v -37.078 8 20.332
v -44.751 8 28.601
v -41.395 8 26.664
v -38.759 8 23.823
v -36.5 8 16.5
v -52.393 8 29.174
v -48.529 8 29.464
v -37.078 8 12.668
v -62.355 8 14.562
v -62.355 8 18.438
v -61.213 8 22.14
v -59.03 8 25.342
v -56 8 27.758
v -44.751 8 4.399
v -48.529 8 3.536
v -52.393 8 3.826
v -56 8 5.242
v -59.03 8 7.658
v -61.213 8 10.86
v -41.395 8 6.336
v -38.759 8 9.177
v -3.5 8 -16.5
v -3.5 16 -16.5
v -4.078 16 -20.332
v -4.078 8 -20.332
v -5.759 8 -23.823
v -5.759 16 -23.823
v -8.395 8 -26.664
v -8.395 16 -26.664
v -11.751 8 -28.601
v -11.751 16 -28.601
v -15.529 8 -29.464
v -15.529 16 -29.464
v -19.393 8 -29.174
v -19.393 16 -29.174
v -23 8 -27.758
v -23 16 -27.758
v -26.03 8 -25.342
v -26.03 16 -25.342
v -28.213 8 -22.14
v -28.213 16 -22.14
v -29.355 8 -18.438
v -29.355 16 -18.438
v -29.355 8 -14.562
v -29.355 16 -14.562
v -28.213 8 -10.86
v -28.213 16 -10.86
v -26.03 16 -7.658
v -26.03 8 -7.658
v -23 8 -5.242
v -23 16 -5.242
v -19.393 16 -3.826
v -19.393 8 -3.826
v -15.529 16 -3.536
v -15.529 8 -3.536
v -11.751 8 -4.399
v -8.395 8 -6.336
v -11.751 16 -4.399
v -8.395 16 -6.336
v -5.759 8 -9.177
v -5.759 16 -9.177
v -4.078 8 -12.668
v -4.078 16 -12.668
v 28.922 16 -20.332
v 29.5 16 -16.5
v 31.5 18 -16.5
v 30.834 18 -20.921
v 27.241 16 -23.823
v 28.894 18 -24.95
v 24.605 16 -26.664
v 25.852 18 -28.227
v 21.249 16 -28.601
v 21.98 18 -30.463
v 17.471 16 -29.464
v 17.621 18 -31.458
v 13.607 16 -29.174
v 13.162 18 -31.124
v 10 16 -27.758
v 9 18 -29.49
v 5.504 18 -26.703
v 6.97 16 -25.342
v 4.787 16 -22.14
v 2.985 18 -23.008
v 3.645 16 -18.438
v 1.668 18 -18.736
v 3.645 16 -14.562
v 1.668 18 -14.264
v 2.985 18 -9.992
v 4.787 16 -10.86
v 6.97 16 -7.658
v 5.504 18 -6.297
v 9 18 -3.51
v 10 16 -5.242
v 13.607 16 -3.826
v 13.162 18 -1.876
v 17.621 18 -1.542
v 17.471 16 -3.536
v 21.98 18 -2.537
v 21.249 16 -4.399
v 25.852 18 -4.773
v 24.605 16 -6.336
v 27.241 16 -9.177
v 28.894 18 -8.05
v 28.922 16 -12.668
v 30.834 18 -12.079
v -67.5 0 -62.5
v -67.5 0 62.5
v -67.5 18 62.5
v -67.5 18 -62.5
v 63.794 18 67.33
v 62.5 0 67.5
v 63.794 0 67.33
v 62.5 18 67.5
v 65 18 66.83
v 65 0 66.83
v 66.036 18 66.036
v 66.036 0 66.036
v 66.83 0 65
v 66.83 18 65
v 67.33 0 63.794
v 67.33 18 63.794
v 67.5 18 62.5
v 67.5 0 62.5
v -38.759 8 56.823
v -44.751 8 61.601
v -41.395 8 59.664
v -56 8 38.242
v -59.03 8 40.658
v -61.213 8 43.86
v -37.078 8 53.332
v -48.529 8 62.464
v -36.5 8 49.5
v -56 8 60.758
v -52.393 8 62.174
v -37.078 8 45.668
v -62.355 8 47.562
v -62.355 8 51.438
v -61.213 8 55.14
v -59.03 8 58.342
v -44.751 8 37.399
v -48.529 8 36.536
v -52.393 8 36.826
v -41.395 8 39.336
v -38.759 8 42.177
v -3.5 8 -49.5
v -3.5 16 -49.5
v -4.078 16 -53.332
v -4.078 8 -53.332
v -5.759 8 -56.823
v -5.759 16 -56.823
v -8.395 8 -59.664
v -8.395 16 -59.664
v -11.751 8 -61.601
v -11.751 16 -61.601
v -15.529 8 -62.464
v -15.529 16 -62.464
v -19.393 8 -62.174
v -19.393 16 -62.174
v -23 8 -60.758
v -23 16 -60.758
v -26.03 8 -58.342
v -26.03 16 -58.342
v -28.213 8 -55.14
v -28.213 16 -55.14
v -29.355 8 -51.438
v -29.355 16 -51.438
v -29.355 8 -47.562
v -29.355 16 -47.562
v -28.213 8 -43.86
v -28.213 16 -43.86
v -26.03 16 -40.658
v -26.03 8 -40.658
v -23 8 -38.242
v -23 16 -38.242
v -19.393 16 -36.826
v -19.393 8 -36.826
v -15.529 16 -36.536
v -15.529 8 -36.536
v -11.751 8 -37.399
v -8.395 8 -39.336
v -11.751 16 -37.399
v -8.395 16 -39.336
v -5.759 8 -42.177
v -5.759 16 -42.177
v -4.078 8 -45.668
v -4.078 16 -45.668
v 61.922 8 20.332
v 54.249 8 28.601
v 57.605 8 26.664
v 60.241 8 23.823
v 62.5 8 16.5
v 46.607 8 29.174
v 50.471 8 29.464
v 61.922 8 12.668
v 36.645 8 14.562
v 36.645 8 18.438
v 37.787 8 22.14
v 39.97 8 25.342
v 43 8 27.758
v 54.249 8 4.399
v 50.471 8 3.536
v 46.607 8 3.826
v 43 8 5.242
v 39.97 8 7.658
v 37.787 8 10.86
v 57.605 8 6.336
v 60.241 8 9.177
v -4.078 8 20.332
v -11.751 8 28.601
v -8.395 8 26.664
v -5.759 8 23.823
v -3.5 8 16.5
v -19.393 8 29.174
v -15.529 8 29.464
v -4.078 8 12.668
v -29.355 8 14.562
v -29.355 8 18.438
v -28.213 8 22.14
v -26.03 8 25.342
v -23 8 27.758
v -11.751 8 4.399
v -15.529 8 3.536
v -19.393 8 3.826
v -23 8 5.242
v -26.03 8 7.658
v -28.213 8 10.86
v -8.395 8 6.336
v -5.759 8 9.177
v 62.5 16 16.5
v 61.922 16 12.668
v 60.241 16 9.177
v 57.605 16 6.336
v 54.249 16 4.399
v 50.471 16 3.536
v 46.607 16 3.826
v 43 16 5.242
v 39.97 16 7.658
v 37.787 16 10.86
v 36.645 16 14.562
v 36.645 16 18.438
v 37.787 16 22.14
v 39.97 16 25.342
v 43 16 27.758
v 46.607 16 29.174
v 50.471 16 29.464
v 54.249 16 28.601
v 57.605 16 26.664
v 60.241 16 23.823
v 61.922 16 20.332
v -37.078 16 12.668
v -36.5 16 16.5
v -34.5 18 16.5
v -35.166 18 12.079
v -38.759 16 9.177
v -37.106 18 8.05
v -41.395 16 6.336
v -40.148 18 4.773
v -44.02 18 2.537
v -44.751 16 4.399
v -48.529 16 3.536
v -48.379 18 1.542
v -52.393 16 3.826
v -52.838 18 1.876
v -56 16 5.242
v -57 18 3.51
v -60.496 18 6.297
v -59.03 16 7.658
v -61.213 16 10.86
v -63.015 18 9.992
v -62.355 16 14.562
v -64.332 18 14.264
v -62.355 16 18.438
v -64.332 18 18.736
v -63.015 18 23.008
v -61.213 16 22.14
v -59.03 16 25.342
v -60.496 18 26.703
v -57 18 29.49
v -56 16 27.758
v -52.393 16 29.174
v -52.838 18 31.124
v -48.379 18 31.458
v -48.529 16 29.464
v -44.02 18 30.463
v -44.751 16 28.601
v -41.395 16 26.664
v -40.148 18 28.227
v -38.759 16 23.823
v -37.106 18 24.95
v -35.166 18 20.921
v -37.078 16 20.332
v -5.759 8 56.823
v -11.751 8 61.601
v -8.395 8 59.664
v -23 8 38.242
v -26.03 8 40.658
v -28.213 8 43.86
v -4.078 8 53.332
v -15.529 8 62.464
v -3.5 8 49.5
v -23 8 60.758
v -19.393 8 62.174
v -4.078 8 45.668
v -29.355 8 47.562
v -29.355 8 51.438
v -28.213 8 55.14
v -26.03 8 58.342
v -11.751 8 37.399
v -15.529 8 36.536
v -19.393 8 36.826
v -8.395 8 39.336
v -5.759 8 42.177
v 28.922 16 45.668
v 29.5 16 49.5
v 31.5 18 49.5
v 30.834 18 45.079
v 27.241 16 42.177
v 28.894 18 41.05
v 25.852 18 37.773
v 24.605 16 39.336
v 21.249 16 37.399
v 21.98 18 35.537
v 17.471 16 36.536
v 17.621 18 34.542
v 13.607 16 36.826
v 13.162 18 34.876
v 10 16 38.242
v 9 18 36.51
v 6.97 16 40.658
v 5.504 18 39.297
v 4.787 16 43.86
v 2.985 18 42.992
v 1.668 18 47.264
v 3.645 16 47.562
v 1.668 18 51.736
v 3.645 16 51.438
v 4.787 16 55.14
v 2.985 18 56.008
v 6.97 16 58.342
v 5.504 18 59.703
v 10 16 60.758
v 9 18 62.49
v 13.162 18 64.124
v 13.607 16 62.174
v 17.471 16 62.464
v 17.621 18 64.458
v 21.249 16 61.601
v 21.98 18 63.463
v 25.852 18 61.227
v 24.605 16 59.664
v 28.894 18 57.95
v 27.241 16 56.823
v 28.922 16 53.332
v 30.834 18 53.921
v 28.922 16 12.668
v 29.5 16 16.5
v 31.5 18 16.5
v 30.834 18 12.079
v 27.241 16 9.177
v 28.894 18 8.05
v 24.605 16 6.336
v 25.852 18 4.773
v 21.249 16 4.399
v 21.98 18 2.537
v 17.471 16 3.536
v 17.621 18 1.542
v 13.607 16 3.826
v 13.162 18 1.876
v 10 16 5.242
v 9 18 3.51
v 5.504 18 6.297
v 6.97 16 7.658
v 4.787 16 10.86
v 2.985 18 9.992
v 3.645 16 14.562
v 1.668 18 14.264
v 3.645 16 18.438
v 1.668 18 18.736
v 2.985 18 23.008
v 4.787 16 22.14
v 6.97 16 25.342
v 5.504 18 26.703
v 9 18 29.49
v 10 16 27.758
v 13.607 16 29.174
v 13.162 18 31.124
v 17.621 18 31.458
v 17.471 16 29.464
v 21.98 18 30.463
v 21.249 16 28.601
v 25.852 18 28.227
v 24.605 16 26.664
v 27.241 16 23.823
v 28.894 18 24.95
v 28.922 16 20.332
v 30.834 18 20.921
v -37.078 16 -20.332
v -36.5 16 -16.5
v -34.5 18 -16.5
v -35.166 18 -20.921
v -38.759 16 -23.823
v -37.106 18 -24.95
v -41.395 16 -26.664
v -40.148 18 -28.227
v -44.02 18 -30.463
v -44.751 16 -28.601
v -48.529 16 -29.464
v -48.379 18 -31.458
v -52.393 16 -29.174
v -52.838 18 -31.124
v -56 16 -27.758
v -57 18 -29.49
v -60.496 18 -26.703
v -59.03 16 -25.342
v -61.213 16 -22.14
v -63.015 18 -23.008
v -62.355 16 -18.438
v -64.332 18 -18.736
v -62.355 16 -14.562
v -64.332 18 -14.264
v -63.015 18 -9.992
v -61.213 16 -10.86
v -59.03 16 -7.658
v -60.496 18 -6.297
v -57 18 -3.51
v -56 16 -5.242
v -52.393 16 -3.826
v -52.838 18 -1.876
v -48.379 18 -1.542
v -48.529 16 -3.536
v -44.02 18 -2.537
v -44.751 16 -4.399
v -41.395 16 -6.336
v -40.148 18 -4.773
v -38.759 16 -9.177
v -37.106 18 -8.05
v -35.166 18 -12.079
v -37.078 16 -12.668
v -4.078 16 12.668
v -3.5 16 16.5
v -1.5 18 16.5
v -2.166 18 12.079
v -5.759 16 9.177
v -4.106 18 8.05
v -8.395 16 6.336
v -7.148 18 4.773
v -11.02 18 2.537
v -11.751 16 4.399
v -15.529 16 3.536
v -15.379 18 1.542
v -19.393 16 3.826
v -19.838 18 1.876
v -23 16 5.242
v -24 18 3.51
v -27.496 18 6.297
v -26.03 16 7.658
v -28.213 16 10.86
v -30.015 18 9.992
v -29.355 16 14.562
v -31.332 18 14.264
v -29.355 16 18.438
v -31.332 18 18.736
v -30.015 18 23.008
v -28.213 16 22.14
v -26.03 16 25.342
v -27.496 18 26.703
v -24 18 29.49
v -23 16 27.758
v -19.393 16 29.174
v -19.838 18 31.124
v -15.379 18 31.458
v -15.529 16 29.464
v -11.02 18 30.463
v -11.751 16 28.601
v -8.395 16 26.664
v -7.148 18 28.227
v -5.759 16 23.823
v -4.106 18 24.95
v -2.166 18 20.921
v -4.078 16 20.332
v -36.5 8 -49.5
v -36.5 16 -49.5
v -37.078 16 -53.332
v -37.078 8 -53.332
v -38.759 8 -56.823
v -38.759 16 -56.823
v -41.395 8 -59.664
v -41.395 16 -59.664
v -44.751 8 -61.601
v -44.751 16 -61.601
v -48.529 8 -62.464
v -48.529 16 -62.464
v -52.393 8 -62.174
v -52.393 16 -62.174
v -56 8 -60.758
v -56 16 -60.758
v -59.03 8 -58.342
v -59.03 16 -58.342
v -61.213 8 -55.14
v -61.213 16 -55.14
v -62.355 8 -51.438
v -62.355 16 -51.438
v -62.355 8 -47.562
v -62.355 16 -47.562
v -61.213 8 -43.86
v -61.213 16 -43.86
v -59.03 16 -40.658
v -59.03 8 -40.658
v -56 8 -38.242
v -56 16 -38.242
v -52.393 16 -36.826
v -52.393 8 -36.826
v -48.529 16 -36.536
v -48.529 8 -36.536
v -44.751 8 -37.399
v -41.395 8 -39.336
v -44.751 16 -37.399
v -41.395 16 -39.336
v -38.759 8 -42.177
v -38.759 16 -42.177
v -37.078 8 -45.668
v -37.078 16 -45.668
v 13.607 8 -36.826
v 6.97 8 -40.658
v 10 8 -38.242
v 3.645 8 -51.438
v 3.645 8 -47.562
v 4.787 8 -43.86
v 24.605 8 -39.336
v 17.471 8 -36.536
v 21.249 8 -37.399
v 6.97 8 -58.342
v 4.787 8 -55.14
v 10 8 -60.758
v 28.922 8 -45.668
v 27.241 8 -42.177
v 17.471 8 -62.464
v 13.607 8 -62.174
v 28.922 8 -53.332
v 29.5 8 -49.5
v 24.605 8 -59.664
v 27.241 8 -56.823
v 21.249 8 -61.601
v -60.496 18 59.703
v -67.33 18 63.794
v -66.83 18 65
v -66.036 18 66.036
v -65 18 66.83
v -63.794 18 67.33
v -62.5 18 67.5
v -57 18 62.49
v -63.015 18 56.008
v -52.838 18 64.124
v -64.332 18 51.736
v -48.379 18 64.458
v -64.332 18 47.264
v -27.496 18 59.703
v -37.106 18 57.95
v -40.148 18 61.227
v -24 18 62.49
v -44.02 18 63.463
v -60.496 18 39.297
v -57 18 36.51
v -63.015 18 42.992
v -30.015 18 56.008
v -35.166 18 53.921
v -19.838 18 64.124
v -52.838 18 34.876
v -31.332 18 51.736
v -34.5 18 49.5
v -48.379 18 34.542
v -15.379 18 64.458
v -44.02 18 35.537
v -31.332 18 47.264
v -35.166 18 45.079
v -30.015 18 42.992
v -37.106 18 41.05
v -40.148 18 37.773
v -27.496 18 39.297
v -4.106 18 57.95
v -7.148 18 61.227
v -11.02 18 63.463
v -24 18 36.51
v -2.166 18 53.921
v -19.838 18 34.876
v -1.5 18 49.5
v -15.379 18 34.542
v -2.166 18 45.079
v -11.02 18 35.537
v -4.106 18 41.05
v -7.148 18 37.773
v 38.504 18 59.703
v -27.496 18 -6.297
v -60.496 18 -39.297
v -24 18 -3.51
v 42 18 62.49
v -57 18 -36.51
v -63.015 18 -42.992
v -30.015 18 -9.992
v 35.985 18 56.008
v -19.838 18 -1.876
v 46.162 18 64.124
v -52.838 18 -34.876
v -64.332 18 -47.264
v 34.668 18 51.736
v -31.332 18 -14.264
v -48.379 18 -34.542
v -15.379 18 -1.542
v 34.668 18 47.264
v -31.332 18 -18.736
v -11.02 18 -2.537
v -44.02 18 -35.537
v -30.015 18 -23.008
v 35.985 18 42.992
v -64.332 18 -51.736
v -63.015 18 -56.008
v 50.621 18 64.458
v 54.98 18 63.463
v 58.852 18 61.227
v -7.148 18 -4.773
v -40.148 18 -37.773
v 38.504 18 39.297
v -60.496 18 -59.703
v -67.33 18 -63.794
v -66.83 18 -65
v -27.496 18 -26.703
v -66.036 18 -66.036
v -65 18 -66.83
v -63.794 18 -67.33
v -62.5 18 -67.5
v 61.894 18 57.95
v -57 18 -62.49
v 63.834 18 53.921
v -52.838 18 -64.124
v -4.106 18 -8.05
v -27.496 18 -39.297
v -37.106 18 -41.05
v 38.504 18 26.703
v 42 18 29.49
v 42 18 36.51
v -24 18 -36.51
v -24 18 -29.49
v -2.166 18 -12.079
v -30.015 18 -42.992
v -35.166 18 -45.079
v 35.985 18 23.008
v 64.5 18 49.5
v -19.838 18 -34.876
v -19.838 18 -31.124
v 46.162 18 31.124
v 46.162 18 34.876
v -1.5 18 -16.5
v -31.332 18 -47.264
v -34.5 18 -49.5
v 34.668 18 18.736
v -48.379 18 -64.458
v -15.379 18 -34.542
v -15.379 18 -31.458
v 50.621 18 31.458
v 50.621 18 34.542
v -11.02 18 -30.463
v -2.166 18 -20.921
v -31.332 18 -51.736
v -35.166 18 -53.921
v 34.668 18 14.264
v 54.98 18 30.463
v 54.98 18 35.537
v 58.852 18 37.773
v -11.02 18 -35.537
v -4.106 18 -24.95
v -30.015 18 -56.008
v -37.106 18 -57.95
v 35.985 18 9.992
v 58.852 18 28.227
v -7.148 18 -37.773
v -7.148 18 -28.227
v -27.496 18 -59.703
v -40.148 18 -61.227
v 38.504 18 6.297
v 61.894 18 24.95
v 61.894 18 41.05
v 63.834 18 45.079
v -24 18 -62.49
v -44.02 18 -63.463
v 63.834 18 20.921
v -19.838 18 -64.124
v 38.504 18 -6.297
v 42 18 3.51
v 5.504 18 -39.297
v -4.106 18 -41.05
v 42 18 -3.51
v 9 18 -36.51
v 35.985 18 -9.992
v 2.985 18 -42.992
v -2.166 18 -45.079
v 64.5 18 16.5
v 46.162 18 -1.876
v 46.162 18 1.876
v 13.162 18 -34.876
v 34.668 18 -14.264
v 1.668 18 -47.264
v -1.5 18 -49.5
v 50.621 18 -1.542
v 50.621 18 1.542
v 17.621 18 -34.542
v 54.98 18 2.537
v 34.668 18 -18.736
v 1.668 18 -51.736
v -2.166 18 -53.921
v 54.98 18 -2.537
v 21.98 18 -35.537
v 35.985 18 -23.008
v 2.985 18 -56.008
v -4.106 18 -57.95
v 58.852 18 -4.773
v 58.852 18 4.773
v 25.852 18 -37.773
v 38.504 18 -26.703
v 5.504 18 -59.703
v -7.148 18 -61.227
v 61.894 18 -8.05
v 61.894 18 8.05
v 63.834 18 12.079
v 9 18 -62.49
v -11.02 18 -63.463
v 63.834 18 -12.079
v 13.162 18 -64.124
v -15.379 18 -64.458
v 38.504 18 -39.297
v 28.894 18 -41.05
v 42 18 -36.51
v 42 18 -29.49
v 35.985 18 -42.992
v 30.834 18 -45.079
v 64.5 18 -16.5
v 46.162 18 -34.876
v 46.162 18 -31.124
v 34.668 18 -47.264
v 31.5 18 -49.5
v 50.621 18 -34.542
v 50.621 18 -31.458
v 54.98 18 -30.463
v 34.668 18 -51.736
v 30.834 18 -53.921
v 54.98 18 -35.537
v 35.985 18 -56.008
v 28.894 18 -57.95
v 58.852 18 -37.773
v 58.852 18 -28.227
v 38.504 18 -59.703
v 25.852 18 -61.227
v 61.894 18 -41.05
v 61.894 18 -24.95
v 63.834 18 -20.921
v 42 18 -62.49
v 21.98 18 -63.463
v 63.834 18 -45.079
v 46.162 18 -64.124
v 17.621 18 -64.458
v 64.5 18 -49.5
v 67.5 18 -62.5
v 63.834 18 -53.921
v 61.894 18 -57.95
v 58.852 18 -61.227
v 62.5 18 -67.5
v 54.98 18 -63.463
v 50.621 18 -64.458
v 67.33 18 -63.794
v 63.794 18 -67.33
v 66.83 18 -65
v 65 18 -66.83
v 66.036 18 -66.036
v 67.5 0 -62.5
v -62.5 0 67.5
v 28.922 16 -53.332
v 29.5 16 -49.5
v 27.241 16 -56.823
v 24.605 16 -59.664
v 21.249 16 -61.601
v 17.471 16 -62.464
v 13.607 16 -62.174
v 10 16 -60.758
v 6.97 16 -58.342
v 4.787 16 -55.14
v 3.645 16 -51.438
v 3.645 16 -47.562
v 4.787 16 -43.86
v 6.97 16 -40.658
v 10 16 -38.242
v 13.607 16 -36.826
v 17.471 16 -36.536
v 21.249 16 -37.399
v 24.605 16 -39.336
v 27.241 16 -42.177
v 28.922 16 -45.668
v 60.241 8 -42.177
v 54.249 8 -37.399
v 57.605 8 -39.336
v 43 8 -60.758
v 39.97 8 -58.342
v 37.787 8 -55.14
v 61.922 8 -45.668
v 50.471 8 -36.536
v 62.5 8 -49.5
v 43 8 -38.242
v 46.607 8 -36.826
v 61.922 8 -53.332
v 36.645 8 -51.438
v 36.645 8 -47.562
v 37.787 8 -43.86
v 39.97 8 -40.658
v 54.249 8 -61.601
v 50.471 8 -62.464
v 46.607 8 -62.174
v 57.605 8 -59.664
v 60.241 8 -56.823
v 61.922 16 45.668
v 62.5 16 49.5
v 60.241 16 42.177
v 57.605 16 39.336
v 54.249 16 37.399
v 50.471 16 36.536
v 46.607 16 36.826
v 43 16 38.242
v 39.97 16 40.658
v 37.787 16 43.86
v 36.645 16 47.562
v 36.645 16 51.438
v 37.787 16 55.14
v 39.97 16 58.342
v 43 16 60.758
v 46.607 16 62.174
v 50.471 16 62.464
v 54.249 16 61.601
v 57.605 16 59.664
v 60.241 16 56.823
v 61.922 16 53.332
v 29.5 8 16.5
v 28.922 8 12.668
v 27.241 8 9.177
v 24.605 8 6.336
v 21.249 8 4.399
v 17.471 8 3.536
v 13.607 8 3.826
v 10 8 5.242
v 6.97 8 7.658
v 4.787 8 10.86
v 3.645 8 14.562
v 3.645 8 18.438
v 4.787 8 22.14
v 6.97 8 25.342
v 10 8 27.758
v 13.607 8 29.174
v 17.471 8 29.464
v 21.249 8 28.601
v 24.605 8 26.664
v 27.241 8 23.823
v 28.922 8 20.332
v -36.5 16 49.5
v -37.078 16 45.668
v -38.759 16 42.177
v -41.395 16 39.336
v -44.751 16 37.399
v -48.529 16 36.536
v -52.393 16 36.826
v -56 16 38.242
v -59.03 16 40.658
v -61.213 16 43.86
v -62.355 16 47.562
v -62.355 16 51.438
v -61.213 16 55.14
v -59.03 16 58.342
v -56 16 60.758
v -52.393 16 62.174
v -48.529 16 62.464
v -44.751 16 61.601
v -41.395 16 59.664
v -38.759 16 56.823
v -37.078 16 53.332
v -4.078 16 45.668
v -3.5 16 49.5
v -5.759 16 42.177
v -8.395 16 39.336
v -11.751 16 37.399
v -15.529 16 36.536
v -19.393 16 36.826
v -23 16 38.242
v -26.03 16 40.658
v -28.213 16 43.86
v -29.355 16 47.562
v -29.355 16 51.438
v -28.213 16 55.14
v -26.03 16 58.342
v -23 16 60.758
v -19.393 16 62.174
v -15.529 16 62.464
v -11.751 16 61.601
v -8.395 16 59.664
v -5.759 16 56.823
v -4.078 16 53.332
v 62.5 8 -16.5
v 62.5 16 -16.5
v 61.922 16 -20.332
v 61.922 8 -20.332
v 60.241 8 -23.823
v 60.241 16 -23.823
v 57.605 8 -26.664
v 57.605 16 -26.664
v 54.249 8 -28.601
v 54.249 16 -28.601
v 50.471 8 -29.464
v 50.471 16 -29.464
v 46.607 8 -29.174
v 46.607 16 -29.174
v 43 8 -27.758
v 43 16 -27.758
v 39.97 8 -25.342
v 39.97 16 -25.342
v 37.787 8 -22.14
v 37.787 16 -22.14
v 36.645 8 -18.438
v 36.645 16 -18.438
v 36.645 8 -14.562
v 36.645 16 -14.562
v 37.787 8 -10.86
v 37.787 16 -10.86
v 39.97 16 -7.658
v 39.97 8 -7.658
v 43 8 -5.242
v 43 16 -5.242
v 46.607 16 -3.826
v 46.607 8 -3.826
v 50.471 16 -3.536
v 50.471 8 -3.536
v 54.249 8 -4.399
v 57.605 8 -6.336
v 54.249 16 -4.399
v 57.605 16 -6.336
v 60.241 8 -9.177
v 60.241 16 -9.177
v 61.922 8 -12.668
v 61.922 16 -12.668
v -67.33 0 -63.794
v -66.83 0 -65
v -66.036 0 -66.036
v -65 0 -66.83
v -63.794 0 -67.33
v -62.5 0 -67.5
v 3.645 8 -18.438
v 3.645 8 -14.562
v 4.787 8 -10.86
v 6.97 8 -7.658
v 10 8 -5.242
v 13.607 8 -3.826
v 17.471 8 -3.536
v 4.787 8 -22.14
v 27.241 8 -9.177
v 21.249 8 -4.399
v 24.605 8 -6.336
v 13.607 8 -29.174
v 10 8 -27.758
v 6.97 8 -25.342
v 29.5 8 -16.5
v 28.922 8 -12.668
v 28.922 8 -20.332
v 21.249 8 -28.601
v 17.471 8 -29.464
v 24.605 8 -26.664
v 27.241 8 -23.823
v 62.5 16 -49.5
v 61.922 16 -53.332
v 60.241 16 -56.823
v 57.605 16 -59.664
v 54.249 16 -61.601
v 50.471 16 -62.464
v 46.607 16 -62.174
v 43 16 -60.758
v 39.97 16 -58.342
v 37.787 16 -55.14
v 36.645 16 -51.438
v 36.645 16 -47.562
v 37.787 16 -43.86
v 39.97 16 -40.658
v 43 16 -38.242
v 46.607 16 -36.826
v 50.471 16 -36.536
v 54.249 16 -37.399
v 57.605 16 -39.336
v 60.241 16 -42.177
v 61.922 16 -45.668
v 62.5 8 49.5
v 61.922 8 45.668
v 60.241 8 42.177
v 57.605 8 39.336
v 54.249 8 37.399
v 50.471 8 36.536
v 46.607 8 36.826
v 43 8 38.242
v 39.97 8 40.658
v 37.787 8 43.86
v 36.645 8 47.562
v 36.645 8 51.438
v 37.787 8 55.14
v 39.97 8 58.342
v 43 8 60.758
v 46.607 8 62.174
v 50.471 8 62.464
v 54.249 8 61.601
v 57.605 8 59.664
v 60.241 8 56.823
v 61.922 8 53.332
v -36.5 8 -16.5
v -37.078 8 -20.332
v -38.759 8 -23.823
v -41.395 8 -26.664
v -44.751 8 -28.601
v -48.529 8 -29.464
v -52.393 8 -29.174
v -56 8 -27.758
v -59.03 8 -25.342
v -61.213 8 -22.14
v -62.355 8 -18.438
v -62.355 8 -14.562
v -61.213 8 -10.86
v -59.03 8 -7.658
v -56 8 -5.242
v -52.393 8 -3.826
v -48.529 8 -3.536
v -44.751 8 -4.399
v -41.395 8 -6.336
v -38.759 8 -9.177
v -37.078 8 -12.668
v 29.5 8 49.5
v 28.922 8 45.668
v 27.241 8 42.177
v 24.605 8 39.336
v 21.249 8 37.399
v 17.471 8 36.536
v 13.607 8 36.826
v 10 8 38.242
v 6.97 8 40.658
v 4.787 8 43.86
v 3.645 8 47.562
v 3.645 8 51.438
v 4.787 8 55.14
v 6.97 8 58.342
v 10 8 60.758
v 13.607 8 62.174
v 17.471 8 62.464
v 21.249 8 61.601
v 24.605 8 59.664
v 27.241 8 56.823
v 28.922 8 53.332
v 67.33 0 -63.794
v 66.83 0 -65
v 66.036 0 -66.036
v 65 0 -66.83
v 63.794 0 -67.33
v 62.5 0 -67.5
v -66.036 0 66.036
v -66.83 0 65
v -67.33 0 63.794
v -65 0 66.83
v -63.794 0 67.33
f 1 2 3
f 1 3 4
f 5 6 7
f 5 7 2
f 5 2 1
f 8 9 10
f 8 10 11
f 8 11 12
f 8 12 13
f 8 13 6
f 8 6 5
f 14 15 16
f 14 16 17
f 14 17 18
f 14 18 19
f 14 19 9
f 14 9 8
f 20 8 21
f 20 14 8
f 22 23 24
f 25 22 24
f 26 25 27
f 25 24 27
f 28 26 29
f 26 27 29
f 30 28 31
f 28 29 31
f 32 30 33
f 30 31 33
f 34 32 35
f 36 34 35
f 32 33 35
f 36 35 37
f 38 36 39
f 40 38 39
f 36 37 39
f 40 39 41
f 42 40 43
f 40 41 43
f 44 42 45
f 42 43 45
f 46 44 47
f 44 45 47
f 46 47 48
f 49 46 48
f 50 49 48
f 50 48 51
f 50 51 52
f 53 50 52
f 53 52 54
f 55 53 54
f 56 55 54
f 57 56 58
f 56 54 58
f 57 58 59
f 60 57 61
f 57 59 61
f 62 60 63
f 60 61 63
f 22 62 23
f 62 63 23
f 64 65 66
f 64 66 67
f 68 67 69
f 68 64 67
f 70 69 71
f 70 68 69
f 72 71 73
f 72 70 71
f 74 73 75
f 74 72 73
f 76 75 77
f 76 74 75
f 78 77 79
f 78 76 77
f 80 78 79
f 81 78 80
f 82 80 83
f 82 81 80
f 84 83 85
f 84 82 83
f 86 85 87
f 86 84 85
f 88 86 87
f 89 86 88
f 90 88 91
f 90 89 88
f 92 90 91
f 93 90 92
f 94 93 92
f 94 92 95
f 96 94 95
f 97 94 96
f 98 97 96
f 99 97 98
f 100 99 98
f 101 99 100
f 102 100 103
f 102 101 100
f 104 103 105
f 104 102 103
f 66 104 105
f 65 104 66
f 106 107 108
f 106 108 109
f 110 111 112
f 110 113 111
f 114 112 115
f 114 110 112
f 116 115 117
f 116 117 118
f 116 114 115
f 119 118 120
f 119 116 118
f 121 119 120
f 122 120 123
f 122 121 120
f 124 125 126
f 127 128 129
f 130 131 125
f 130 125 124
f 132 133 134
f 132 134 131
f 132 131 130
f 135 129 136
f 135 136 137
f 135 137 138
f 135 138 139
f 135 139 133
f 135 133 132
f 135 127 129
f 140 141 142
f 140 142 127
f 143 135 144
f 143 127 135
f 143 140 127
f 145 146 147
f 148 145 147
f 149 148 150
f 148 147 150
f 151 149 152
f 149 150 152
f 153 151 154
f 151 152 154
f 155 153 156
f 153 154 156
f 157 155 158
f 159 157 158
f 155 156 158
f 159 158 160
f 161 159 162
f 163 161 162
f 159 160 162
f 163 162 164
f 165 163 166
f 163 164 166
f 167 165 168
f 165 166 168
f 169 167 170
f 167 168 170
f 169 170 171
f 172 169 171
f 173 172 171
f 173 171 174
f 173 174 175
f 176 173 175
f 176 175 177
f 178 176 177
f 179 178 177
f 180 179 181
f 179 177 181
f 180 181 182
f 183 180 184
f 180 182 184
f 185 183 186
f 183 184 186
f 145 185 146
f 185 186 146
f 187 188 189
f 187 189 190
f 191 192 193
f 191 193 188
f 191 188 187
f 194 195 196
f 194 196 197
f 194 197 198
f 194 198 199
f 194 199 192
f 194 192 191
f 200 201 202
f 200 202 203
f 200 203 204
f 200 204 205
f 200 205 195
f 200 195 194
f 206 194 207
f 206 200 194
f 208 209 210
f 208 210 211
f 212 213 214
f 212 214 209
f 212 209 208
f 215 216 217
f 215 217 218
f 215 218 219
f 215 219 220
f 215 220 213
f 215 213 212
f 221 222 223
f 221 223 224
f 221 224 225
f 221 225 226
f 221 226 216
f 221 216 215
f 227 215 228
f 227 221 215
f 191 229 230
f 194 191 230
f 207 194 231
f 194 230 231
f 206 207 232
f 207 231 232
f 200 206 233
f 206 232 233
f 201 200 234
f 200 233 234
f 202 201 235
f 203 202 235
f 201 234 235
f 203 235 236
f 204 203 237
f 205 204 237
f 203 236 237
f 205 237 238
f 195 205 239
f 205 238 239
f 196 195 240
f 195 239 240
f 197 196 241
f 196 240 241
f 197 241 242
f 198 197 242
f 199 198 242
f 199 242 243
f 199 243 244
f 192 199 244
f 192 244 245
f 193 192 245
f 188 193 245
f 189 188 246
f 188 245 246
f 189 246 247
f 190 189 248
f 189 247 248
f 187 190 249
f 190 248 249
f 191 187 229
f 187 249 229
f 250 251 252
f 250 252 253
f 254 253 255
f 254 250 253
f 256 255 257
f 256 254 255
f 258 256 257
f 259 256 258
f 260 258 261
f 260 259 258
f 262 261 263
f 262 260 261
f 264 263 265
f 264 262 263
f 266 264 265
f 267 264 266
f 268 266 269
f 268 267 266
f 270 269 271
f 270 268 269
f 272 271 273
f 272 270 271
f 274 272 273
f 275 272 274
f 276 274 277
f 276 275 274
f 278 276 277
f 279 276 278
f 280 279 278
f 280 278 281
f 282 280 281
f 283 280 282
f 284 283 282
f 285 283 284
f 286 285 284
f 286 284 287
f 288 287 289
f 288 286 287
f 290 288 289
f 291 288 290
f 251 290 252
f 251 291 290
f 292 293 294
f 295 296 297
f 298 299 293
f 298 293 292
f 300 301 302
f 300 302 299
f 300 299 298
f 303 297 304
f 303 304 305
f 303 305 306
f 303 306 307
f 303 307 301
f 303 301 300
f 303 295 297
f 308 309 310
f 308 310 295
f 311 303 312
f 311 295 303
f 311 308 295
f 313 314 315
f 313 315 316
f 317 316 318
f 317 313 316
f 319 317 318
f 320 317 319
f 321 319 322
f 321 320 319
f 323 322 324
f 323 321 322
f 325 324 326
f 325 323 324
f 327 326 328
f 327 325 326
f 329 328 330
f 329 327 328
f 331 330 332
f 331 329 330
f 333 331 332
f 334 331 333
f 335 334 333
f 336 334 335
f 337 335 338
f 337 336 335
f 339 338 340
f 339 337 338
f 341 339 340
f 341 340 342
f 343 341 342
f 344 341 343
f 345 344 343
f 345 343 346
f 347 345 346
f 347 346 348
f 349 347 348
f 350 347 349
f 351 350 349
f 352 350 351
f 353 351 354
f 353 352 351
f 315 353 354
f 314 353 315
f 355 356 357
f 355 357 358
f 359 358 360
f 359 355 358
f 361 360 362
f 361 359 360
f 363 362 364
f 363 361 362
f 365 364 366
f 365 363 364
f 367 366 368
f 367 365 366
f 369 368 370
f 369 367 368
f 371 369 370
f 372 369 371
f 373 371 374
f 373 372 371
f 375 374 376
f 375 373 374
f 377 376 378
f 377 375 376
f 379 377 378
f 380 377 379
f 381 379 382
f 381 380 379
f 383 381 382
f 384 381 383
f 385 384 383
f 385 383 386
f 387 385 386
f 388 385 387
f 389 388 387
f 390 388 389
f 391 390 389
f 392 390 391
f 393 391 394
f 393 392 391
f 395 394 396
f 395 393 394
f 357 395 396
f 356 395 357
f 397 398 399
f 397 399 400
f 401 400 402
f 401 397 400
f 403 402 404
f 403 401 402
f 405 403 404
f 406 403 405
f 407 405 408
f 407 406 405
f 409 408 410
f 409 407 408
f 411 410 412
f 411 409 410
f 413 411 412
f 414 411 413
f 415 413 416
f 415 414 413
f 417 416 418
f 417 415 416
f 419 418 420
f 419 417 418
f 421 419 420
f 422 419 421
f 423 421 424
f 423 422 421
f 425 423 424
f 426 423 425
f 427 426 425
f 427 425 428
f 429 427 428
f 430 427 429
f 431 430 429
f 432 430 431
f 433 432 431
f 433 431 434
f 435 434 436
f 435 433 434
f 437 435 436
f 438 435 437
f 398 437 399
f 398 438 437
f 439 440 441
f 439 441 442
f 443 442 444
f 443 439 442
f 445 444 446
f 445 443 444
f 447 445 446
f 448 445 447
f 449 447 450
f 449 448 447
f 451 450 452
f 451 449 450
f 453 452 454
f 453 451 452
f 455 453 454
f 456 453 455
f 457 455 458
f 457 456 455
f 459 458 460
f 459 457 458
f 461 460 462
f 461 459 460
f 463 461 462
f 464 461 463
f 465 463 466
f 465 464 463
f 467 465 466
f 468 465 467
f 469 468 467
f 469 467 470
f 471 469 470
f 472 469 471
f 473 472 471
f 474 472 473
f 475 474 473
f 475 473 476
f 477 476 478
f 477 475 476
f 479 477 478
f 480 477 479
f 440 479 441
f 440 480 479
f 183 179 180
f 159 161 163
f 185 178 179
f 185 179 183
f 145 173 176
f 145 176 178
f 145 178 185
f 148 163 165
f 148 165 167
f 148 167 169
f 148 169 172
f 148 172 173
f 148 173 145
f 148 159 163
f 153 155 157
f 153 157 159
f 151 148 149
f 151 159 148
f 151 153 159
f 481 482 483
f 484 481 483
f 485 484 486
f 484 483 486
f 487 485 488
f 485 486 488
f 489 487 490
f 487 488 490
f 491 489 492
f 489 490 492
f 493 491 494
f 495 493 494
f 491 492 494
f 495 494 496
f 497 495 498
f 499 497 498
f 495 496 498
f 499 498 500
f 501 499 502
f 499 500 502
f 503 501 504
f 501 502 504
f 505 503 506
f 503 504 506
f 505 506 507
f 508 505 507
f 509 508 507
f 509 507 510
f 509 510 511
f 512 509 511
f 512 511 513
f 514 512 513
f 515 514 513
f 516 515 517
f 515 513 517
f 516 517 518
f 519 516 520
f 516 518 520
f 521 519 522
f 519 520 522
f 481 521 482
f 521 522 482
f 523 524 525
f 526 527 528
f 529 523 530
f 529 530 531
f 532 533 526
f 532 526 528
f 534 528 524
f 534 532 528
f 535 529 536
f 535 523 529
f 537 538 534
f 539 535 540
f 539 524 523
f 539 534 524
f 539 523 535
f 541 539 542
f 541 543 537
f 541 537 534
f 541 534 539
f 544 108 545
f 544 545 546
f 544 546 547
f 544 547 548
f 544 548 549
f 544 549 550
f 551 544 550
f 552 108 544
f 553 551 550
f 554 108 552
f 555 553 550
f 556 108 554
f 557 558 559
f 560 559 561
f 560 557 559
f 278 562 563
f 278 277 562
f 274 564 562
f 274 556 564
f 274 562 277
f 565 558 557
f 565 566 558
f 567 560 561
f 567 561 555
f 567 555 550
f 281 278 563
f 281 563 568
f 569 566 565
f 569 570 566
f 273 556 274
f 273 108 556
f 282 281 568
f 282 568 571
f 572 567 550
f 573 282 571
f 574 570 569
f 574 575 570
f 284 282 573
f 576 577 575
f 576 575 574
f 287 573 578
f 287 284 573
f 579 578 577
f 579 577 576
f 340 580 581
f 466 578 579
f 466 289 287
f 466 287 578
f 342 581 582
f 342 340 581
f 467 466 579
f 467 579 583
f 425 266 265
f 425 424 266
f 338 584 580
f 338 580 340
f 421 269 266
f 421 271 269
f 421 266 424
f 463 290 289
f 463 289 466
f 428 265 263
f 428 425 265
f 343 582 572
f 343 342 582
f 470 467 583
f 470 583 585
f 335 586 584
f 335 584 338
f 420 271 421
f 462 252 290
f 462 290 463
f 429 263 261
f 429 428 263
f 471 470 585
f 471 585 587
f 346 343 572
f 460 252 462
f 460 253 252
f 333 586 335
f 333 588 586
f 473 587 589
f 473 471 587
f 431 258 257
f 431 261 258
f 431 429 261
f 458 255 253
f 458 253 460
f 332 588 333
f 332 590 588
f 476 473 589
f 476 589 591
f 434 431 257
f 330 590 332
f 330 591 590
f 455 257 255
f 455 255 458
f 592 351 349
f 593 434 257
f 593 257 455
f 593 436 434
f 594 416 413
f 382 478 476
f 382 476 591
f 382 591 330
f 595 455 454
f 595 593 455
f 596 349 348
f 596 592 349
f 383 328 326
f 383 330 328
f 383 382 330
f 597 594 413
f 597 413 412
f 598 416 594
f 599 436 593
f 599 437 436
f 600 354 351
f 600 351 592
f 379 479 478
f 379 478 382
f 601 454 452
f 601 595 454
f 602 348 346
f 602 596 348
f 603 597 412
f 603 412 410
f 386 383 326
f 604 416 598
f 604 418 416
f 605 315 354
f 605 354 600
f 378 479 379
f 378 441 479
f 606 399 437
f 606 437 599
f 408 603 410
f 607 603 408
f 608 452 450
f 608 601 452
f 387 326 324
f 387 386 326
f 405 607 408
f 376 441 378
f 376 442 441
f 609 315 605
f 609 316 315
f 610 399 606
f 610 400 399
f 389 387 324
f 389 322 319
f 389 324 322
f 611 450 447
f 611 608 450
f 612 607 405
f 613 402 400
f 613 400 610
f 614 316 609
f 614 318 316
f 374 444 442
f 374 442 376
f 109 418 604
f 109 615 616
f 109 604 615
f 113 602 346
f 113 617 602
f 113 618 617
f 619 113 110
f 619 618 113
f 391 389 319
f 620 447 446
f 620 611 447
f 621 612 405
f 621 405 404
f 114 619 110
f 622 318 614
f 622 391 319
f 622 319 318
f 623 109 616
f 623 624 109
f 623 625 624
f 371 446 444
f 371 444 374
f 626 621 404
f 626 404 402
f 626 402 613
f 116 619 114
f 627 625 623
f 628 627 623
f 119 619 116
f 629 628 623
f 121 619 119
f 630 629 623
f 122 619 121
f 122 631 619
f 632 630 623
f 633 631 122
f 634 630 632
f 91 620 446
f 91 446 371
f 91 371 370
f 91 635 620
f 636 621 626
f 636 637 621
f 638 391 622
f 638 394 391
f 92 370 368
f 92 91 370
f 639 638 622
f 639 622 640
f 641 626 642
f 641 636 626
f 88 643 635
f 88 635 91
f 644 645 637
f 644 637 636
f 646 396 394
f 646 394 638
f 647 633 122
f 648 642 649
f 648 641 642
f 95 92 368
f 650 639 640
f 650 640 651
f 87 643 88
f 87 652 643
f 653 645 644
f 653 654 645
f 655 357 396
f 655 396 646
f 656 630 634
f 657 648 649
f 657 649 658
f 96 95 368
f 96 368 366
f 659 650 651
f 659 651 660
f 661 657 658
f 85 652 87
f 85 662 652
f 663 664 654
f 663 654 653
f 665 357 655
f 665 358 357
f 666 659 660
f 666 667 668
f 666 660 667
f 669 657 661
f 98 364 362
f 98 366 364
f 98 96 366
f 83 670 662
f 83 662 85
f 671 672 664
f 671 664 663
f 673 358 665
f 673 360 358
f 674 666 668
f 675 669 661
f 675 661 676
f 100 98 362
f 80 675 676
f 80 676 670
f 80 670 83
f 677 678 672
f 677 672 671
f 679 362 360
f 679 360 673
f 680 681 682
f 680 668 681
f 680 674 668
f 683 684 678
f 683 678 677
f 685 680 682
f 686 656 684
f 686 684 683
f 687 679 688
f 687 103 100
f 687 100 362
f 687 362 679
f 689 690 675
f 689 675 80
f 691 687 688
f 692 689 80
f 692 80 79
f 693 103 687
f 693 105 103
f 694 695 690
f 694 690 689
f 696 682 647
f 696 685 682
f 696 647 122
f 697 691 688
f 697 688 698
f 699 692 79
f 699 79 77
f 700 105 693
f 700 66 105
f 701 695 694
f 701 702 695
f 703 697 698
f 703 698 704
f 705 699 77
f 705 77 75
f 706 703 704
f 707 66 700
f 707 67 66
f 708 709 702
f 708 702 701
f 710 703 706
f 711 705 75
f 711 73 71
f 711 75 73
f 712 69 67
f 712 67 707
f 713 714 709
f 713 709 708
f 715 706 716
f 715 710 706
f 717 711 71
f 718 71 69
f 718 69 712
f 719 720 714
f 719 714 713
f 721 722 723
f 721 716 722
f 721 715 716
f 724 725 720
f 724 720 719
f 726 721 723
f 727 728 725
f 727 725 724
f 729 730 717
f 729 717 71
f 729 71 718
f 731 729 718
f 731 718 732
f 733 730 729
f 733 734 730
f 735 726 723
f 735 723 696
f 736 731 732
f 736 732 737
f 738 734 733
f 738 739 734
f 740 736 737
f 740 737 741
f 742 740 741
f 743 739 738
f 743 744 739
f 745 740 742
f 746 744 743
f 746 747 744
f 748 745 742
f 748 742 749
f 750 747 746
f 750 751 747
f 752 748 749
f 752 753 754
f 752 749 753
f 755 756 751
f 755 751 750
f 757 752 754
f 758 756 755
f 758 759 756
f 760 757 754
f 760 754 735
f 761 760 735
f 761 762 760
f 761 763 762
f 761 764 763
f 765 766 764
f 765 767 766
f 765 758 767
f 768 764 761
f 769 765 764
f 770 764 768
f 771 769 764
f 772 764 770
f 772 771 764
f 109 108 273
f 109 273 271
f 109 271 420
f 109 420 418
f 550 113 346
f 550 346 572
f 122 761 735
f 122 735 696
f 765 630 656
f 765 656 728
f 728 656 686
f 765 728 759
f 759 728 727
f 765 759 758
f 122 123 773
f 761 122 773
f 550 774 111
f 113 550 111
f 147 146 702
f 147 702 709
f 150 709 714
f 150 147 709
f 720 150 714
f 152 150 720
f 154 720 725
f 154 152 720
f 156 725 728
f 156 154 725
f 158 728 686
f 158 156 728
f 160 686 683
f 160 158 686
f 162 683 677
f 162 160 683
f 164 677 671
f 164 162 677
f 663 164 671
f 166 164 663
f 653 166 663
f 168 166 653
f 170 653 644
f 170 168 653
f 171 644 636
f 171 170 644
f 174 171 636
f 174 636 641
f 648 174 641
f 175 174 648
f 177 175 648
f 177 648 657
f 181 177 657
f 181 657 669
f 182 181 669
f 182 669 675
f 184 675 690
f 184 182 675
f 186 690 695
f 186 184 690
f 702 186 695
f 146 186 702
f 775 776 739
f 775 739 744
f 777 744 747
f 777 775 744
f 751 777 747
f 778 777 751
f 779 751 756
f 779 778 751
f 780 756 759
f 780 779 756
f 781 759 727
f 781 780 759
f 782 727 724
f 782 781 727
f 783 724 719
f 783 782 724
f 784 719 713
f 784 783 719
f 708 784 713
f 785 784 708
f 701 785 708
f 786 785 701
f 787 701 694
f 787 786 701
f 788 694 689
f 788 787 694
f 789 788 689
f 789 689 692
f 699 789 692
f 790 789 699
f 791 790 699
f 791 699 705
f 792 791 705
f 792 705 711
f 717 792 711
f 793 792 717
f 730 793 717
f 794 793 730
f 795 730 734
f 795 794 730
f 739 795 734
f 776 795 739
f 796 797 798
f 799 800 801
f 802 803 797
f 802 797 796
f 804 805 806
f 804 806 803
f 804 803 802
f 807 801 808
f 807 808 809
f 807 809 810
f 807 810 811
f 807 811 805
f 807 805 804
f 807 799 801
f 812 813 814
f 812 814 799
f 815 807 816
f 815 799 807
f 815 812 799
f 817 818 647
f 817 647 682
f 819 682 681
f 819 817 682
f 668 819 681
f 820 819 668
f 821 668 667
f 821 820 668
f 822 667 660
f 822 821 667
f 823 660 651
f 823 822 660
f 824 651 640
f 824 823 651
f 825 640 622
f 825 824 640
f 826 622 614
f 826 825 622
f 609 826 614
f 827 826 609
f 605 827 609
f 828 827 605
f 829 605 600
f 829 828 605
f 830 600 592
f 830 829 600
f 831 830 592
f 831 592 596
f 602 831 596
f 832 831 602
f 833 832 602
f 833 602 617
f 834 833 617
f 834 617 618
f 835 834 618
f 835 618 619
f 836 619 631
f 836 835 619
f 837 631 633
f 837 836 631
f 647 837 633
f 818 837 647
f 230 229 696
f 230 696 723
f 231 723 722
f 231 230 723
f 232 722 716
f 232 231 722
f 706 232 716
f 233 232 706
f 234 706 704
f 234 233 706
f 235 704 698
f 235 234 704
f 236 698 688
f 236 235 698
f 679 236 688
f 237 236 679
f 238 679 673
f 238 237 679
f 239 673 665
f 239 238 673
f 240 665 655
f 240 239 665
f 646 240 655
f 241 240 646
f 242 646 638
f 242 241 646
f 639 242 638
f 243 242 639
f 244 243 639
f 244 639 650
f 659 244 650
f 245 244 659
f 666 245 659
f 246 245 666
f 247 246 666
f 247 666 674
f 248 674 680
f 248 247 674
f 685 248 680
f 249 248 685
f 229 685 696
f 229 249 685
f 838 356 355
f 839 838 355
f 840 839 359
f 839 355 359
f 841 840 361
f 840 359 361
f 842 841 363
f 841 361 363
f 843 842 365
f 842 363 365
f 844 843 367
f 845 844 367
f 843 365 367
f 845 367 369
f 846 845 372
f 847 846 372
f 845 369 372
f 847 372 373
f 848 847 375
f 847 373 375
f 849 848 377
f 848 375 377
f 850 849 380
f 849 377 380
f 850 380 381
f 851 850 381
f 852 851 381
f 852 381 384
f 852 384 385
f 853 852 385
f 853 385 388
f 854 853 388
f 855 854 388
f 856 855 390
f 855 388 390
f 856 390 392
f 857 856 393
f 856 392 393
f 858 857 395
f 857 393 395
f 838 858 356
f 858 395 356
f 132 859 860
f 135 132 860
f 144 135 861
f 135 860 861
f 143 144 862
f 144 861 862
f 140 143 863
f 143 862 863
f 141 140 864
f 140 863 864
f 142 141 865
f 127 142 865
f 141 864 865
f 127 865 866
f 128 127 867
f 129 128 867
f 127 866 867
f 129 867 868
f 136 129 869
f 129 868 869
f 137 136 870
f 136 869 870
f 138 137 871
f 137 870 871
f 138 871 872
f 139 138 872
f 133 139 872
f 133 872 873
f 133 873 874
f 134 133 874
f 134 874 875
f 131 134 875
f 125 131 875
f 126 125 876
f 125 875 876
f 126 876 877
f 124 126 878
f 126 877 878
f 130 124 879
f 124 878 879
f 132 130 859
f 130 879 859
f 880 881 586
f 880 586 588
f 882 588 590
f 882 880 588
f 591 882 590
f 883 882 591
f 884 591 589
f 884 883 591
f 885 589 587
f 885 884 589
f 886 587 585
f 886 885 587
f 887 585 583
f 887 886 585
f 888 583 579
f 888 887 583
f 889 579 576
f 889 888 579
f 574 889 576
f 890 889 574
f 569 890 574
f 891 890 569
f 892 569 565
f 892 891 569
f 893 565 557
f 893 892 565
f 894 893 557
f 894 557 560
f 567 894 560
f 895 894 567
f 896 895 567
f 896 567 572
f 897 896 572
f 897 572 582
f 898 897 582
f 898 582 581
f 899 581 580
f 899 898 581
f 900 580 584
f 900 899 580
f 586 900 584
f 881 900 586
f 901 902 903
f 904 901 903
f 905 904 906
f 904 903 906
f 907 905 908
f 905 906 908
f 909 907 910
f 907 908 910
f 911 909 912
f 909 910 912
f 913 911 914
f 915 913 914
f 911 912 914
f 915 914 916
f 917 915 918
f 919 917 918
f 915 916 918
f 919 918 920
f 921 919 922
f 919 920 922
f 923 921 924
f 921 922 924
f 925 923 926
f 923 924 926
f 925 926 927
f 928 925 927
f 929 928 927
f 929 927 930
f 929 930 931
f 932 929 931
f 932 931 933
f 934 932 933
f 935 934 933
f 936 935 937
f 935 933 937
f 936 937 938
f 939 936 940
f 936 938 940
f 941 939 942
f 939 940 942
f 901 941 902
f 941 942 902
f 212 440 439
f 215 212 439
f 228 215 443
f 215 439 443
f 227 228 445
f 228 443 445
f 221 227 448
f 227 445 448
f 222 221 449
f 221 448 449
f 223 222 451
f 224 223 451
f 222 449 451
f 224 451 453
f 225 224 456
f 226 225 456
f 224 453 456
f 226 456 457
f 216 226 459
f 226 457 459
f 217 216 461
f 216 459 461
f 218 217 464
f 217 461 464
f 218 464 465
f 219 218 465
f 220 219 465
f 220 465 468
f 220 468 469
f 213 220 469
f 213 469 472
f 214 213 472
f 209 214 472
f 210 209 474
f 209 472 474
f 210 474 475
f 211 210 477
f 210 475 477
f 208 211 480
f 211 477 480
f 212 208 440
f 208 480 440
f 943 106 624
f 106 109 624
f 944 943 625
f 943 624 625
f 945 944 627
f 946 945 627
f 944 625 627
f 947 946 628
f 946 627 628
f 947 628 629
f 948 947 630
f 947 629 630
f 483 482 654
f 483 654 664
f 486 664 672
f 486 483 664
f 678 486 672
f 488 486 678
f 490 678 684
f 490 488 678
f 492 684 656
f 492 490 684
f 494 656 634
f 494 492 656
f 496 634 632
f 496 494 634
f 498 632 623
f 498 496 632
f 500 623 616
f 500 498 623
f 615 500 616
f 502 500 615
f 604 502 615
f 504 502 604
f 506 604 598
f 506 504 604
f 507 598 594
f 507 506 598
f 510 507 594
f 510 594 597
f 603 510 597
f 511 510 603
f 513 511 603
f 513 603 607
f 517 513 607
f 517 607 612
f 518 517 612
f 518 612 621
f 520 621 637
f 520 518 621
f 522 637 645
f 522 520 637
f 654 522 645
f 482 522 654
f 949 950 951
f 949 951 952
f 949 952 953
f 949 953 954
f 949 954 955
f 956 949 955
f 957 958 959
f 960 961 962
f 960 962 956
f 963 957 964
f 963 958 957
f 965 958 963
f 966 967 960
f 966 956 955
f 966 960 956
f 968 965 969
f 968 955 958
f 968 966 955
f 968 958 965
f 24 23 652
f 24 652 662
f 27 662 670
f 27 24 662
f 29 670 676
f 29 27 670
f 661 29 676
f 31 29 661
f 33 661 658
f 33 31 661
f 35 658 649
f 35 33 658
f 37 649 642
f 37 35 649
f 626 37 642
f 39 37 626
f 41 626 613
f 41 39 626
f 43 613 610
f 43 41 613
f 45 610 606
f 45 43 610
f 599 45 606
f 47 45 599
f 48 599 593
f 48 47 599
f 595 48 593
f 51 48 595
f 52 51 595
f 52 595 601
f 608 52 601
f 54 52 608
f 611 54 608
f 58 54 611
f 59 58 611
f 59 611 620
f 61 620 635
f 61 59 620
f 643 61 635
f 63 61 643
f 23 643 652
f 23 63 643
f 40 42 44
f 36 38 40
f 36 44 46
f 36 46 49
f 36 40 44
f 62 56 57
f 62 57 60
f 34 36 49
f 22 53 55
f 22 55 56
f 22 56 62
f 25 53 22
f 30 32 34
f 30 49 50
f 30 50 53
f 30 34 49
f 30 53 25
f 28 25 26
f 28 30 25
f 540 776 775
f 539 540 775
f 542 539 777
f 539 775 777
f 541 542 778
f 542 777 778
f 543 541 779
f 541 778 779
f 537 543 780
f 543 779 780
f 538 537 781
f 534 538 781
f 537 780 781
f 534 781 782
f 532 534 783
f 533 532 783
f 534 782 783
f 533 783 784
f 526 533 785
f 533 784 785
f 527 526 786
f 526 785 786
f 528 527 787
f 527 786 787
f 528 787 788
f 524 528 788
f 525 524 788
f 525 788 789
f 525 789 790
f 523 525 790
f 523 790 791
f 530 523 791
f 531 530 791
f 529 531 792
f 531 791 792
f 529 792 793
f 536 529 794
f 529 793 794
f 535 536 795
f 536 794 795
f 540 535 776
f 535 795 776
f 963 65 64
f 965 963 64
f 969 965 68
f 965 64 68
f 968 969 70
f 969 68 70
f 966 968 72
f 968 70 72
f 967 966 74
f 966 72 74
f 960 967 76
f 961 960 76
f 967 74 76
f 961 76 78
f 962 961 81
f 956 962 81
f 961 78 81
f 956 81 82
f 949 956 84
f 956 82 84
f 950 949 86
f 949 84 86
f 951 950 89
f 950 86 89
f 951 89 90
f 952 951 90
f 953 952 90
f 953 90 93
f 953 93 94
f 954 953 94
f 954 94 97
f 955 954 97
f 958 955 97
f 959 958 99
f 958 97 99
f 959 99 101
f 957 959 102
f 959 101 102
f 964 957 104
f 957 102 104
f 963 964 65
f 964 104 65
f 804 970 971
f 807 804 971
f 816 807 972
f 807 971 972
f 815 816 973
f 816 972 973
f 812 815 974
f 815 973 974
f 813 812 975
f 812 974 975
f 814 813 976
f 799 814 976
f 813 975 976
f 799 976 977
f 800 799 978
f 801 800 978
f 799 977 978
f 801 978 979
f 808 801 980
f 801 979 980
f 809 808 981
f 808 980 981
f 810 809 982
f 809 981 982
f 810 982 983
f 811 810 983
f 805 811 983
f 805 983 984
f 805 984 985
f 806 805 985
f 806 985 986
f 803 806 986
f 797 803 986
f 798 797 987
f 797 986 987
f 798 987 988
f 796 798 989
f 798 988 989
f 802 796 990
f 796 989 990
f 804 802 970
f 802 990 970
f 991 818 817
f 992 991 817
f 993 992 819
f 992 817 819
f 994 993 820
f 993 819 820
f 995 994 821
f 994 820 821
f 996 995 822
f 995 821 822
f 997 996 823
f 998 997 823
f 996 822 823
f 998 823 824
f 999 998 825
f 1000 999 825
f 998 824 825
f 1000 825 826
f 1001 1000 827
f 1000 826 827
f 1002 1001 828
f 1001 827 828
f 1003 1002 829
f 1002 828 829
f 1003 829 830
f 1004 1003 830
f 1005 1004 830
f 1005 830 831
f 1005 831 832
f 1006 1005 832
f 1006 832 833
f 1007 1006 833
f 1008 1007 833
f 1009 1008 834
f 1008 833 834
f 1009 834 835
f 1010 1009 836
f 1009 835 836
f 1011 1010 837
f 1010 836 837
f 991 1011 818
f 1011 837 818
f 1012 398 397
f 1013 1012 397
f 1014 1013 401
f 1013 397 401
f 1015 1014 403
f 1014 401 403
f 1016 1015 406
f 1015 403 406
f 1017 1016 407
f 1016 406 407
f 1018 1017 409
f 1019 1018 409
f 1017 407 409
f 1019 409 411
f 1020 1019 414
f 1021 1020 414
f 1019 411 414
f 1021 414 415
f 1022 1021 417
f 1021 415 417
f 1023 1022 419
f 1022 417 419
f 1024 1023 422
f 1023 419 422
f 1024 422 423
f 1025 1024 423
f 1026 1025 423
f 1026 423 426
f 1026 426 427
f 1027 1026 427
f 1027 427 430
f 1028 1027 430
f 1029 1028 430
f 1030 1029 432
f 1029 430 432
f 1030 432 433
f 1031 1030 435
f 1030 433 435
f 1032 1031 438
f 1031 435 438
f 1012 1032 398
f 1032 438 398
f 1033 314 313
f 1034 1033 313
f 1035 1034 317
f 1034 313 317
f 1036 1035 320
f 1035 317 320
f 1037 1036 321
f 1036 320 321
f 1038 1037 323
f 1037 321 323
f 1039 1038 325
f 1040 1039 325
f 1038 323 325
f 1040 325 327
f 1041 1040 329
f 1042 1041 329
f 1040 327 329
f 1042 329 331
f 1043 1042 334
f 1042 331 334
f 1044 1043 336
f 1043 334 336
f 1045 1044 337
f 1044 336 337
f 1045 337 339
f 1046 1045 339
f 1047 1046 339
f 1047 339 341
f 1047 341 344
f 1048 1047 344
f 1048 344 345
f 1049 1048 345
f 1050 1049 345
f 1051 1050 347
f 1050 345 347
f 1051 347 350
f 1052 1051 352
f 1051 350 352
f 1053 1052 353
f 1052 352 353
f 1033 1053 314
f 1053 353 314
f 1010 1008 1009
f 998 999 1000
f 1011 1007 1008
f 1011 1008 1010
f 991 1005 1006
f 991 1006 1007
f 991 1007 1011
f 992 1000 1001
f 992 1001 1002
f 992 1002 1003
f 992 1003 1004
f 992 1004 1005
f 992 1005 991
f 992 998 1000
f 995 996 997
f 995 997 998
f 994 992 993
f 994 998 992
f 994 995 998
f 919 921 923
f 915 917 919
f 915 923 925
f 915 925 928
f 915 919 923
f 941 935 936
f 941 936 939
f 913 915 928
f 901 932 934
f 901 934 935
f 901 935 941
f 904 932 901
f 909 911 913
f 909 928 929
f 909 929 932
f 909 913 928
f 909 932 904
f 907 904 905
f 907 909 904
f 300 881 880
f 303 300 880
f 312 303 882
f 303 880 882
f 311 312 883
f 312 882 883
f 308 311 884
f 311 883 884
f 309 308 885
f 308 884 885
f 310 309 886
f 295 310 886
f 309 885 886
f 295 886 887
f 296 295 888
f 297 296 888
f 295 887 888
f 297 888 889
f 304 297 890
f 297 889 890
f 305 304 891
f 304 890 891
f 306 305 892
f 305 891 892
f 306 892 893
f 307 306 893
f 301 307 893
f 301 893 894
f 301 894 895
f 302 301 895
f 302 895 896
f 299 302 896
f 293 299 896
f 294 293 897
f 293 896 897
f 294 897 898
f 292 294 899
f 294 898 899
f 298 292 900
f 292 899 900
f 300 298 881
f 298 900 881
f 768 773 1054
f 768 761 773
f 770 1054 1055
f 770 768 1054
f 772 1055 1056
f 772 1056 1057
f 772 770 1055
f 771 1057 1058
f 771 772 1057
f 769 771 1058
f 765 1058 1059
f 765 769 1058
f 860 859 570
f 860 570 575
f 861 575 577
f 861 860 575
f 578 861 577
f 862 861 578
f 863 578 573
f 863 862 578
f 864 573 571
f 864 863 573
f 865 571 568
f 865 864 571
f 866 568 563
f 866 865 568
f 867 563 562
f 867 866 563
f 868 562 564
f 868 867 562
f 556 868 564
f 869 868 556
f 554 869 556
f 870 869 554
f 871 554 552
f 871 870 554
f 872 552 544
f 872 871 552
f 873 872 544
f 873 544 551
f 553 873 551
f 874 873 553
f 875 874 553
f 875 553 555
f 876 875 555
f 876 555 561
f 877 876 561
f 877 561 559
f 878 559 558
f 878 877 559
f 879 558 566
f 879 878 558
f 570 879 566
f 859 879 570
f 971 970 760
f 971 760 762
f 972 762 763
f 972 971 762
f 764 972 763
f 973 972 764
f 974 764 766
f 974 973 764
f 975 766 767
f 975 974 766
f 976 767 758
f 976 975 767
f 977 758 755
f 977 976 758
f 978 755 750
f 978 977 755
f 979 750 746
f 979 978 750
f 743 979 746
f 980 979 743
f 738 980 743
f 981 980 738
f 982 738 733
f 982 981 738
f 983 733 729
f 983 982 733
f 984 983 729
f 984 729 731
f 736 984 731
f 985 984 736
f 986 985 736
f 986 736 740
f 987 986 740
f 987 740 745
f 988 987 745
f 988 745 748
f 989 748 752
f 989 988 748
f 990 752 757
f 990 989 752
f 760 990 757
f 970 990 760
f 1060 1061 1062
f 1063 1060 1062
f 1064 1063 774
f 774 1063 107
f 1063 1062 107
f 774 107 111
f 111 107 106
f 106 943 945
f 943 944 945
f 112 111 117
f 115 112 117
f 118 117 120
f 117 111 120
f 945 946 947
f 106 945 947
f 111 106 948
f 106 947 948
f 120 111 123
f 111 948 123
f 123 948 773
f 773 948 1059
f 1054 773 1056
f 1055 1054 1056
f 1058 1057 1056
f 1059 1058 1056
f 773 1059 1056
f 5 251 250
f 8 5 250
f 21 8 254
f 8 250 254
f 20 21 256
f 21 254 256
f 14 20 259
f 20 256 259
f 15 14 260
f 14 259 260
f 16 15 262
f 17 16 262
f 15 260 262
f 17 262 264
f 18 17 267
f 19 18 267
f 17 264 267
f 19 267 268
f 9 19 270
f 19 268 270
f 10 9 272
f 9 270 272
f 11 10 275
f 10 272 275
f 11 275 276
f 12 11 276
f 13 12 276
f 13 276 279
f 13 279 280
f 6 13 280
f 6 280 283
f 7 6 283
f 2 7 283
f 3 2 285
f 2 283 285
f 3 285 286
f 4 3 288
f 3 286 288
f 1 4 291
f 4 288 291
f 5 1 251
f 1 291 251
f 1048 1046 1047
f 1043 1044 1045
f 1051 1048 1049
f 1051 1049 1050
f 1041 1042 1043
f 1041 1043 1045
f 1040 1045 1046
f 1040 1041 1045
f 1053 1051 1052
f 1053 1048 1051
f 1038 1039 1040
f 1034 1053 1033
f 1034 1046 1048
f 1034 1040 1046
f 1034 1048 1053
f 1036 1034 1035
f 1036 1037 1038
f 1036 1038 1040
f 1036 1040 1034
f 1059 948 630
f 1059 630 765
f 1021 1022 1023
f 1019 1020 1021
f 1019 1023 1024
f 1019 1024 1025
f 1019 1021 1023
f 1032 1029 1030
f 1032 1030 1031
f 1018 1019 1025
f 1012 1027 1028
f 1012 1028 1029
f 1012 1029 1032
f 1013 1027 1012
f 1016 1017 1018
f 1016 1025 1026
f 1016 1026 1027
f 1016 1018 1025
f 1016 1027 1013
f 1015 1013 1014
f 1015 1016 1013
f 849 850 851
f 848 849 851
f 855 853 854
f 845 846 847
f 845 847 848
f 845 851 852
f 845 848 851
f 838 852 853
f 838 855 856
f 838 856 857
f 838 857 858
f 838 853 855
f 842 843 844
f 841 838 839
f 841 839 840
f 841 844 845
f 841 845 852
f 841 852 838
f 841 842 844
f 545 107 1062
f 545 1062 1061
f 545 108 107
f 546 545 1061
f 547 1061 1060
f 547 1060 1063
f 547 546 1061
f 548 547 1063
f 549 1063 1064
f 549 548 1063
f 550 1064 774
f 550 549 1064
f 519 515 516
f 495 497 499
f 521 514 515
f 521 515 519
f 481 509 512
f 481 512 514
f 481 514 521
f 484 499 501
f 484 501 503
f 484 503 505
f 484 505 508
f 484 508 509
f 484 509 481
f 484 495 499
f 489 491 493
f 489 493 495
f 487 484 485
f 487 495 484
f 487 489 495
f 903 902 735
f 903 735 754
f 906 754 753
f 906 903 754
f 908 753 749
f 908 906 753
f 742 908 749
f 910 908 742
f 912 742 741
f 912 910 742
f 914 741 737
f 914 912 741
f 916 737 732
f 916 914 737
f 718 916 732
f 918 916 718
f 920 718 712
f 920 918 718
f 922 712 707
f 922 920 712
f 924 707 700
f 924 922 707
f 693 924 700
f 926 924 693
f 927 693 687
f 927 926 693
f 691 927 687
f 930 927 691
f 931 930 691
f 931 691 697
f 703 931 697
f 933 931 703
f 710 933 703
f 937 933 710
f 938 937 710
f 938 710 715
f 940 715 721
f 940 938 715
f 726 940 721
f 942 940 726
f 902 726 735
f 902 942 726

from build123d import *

# Parameters (mm, degrees)
SKETCH1_W           = 135
SKETCH1_H           = 135
BOSS_EXTRUDE1_DEPTH = 18
FILLET1_R           = 5
SKETCH2_R           = 13
CUT_EXTRUDE1_DEPTH  = 10
CHAMFER1_SIZE       = 2


with BuildPart() as part:
    # Sketch1 → Boss-Extrude1 (new body)
    with BuildSketch(Plane(origin=(0, 0, 0), x_dir=(1, 0, 0), z_dir=(0, 1, 0))):
        Rectangle(SKETCH1_W, SKETCH1_H)
    extrude(amount=BOSS_EXTRUDE1_DEPTH)

    # Fillet1
    fillet1_edges = [part.edges().sort_by_distance(p)[0] for p in [
        (67.5, 9, 67.5),
        (-67.5, 9, 67.5),
        (-67.5, 9, -67.5),
        (67.5, 9, -67.5),
    ]]
    fillet(fillet1_edges, radius=FILLET1_R)

    # Sketch2 → Cut-Extrude1 (cut)
    with BuildSketch(Plane(origin=(0, 18, 0), x_dir=(1, 0, 0), z_dir=(0, 1, 0))):
        with Locations((-49.5, 49.5)):
            Circle(SKETCH2_R)
        with Locations((49.5, 49.5)):
            Circle(SKETCH2_R)
        with Locations((49.5, -49.5)):
            Circle(SKETCH2_R)
        with Locations((-49.5, -49.5)):
            Circle(SKETCH2_R)
        with Locations((-16.5, 49.5)):
            Circle(SKETCH2_R)
        with Locations((16.5, 49.5)):
            Circle(SKETCH2_R)
        with Locations((-16.5, 16.5)):
            Circle(SKETCH2_R)
        with Locations((-49.5, 16.5)):
            Circle(SKETCH2_R)
        with Locations((-16.5, -49.5)):
            Circle(SKETCH2_R)
        with Locations((-49.5, -16.5)):
            Circle(SKETCH2_R)
        with Locations((-16.5, -16.5)):
            Circle(SKETCH2_R)
        with Locations((49.5, 16.5)):
            Circle(SKETCH2_R)
        with Locations((16.5, 16.5)):
            Circle(SKETCH2_R)
        with Locations((49.5, -16.5)):
            Circle(SKETCH2_R)
        with Locations((16.5, -16.5)):
            Circle(SKETCH2_R)
        with Locations((16.5, -49.5)):
            Circle(SKETCH2_R)
    extrude(amount=-CUT_EXTRUDE1_DEPTH, mode=Mode.SUBTRACT)

    # Chamfer1
    chamfer1_edges = [part.edges().sort_by_distance(p)[0] for p in [
        (3.5, 18, -49.5),
        (-29.5, 18, -16.5),
        (-62.5, 18, -16.5),
        (-29.5, 18, 49.5),
        (-29.5, 18, -49.5),
        (-62.5, 18, 49.5),
        (36.5, 18, 49.5),
        (36.5, 18, -49.5),
        (3.5, 18, 49.5),
        (3.5, 18, 16.5),
        (36.5, 18, 16.5),
        (3.5, 18, -16.5),
        (36.5, 18, -16.5),
        (-29.5, 18, 16.5),
        (-62.5, 18, 16.5),
        (-62.5, 18, -49.5),
    ]]
    chamfer(chamfer1_edges, length=CHAMFER1_SIZE)


solid = part.part
